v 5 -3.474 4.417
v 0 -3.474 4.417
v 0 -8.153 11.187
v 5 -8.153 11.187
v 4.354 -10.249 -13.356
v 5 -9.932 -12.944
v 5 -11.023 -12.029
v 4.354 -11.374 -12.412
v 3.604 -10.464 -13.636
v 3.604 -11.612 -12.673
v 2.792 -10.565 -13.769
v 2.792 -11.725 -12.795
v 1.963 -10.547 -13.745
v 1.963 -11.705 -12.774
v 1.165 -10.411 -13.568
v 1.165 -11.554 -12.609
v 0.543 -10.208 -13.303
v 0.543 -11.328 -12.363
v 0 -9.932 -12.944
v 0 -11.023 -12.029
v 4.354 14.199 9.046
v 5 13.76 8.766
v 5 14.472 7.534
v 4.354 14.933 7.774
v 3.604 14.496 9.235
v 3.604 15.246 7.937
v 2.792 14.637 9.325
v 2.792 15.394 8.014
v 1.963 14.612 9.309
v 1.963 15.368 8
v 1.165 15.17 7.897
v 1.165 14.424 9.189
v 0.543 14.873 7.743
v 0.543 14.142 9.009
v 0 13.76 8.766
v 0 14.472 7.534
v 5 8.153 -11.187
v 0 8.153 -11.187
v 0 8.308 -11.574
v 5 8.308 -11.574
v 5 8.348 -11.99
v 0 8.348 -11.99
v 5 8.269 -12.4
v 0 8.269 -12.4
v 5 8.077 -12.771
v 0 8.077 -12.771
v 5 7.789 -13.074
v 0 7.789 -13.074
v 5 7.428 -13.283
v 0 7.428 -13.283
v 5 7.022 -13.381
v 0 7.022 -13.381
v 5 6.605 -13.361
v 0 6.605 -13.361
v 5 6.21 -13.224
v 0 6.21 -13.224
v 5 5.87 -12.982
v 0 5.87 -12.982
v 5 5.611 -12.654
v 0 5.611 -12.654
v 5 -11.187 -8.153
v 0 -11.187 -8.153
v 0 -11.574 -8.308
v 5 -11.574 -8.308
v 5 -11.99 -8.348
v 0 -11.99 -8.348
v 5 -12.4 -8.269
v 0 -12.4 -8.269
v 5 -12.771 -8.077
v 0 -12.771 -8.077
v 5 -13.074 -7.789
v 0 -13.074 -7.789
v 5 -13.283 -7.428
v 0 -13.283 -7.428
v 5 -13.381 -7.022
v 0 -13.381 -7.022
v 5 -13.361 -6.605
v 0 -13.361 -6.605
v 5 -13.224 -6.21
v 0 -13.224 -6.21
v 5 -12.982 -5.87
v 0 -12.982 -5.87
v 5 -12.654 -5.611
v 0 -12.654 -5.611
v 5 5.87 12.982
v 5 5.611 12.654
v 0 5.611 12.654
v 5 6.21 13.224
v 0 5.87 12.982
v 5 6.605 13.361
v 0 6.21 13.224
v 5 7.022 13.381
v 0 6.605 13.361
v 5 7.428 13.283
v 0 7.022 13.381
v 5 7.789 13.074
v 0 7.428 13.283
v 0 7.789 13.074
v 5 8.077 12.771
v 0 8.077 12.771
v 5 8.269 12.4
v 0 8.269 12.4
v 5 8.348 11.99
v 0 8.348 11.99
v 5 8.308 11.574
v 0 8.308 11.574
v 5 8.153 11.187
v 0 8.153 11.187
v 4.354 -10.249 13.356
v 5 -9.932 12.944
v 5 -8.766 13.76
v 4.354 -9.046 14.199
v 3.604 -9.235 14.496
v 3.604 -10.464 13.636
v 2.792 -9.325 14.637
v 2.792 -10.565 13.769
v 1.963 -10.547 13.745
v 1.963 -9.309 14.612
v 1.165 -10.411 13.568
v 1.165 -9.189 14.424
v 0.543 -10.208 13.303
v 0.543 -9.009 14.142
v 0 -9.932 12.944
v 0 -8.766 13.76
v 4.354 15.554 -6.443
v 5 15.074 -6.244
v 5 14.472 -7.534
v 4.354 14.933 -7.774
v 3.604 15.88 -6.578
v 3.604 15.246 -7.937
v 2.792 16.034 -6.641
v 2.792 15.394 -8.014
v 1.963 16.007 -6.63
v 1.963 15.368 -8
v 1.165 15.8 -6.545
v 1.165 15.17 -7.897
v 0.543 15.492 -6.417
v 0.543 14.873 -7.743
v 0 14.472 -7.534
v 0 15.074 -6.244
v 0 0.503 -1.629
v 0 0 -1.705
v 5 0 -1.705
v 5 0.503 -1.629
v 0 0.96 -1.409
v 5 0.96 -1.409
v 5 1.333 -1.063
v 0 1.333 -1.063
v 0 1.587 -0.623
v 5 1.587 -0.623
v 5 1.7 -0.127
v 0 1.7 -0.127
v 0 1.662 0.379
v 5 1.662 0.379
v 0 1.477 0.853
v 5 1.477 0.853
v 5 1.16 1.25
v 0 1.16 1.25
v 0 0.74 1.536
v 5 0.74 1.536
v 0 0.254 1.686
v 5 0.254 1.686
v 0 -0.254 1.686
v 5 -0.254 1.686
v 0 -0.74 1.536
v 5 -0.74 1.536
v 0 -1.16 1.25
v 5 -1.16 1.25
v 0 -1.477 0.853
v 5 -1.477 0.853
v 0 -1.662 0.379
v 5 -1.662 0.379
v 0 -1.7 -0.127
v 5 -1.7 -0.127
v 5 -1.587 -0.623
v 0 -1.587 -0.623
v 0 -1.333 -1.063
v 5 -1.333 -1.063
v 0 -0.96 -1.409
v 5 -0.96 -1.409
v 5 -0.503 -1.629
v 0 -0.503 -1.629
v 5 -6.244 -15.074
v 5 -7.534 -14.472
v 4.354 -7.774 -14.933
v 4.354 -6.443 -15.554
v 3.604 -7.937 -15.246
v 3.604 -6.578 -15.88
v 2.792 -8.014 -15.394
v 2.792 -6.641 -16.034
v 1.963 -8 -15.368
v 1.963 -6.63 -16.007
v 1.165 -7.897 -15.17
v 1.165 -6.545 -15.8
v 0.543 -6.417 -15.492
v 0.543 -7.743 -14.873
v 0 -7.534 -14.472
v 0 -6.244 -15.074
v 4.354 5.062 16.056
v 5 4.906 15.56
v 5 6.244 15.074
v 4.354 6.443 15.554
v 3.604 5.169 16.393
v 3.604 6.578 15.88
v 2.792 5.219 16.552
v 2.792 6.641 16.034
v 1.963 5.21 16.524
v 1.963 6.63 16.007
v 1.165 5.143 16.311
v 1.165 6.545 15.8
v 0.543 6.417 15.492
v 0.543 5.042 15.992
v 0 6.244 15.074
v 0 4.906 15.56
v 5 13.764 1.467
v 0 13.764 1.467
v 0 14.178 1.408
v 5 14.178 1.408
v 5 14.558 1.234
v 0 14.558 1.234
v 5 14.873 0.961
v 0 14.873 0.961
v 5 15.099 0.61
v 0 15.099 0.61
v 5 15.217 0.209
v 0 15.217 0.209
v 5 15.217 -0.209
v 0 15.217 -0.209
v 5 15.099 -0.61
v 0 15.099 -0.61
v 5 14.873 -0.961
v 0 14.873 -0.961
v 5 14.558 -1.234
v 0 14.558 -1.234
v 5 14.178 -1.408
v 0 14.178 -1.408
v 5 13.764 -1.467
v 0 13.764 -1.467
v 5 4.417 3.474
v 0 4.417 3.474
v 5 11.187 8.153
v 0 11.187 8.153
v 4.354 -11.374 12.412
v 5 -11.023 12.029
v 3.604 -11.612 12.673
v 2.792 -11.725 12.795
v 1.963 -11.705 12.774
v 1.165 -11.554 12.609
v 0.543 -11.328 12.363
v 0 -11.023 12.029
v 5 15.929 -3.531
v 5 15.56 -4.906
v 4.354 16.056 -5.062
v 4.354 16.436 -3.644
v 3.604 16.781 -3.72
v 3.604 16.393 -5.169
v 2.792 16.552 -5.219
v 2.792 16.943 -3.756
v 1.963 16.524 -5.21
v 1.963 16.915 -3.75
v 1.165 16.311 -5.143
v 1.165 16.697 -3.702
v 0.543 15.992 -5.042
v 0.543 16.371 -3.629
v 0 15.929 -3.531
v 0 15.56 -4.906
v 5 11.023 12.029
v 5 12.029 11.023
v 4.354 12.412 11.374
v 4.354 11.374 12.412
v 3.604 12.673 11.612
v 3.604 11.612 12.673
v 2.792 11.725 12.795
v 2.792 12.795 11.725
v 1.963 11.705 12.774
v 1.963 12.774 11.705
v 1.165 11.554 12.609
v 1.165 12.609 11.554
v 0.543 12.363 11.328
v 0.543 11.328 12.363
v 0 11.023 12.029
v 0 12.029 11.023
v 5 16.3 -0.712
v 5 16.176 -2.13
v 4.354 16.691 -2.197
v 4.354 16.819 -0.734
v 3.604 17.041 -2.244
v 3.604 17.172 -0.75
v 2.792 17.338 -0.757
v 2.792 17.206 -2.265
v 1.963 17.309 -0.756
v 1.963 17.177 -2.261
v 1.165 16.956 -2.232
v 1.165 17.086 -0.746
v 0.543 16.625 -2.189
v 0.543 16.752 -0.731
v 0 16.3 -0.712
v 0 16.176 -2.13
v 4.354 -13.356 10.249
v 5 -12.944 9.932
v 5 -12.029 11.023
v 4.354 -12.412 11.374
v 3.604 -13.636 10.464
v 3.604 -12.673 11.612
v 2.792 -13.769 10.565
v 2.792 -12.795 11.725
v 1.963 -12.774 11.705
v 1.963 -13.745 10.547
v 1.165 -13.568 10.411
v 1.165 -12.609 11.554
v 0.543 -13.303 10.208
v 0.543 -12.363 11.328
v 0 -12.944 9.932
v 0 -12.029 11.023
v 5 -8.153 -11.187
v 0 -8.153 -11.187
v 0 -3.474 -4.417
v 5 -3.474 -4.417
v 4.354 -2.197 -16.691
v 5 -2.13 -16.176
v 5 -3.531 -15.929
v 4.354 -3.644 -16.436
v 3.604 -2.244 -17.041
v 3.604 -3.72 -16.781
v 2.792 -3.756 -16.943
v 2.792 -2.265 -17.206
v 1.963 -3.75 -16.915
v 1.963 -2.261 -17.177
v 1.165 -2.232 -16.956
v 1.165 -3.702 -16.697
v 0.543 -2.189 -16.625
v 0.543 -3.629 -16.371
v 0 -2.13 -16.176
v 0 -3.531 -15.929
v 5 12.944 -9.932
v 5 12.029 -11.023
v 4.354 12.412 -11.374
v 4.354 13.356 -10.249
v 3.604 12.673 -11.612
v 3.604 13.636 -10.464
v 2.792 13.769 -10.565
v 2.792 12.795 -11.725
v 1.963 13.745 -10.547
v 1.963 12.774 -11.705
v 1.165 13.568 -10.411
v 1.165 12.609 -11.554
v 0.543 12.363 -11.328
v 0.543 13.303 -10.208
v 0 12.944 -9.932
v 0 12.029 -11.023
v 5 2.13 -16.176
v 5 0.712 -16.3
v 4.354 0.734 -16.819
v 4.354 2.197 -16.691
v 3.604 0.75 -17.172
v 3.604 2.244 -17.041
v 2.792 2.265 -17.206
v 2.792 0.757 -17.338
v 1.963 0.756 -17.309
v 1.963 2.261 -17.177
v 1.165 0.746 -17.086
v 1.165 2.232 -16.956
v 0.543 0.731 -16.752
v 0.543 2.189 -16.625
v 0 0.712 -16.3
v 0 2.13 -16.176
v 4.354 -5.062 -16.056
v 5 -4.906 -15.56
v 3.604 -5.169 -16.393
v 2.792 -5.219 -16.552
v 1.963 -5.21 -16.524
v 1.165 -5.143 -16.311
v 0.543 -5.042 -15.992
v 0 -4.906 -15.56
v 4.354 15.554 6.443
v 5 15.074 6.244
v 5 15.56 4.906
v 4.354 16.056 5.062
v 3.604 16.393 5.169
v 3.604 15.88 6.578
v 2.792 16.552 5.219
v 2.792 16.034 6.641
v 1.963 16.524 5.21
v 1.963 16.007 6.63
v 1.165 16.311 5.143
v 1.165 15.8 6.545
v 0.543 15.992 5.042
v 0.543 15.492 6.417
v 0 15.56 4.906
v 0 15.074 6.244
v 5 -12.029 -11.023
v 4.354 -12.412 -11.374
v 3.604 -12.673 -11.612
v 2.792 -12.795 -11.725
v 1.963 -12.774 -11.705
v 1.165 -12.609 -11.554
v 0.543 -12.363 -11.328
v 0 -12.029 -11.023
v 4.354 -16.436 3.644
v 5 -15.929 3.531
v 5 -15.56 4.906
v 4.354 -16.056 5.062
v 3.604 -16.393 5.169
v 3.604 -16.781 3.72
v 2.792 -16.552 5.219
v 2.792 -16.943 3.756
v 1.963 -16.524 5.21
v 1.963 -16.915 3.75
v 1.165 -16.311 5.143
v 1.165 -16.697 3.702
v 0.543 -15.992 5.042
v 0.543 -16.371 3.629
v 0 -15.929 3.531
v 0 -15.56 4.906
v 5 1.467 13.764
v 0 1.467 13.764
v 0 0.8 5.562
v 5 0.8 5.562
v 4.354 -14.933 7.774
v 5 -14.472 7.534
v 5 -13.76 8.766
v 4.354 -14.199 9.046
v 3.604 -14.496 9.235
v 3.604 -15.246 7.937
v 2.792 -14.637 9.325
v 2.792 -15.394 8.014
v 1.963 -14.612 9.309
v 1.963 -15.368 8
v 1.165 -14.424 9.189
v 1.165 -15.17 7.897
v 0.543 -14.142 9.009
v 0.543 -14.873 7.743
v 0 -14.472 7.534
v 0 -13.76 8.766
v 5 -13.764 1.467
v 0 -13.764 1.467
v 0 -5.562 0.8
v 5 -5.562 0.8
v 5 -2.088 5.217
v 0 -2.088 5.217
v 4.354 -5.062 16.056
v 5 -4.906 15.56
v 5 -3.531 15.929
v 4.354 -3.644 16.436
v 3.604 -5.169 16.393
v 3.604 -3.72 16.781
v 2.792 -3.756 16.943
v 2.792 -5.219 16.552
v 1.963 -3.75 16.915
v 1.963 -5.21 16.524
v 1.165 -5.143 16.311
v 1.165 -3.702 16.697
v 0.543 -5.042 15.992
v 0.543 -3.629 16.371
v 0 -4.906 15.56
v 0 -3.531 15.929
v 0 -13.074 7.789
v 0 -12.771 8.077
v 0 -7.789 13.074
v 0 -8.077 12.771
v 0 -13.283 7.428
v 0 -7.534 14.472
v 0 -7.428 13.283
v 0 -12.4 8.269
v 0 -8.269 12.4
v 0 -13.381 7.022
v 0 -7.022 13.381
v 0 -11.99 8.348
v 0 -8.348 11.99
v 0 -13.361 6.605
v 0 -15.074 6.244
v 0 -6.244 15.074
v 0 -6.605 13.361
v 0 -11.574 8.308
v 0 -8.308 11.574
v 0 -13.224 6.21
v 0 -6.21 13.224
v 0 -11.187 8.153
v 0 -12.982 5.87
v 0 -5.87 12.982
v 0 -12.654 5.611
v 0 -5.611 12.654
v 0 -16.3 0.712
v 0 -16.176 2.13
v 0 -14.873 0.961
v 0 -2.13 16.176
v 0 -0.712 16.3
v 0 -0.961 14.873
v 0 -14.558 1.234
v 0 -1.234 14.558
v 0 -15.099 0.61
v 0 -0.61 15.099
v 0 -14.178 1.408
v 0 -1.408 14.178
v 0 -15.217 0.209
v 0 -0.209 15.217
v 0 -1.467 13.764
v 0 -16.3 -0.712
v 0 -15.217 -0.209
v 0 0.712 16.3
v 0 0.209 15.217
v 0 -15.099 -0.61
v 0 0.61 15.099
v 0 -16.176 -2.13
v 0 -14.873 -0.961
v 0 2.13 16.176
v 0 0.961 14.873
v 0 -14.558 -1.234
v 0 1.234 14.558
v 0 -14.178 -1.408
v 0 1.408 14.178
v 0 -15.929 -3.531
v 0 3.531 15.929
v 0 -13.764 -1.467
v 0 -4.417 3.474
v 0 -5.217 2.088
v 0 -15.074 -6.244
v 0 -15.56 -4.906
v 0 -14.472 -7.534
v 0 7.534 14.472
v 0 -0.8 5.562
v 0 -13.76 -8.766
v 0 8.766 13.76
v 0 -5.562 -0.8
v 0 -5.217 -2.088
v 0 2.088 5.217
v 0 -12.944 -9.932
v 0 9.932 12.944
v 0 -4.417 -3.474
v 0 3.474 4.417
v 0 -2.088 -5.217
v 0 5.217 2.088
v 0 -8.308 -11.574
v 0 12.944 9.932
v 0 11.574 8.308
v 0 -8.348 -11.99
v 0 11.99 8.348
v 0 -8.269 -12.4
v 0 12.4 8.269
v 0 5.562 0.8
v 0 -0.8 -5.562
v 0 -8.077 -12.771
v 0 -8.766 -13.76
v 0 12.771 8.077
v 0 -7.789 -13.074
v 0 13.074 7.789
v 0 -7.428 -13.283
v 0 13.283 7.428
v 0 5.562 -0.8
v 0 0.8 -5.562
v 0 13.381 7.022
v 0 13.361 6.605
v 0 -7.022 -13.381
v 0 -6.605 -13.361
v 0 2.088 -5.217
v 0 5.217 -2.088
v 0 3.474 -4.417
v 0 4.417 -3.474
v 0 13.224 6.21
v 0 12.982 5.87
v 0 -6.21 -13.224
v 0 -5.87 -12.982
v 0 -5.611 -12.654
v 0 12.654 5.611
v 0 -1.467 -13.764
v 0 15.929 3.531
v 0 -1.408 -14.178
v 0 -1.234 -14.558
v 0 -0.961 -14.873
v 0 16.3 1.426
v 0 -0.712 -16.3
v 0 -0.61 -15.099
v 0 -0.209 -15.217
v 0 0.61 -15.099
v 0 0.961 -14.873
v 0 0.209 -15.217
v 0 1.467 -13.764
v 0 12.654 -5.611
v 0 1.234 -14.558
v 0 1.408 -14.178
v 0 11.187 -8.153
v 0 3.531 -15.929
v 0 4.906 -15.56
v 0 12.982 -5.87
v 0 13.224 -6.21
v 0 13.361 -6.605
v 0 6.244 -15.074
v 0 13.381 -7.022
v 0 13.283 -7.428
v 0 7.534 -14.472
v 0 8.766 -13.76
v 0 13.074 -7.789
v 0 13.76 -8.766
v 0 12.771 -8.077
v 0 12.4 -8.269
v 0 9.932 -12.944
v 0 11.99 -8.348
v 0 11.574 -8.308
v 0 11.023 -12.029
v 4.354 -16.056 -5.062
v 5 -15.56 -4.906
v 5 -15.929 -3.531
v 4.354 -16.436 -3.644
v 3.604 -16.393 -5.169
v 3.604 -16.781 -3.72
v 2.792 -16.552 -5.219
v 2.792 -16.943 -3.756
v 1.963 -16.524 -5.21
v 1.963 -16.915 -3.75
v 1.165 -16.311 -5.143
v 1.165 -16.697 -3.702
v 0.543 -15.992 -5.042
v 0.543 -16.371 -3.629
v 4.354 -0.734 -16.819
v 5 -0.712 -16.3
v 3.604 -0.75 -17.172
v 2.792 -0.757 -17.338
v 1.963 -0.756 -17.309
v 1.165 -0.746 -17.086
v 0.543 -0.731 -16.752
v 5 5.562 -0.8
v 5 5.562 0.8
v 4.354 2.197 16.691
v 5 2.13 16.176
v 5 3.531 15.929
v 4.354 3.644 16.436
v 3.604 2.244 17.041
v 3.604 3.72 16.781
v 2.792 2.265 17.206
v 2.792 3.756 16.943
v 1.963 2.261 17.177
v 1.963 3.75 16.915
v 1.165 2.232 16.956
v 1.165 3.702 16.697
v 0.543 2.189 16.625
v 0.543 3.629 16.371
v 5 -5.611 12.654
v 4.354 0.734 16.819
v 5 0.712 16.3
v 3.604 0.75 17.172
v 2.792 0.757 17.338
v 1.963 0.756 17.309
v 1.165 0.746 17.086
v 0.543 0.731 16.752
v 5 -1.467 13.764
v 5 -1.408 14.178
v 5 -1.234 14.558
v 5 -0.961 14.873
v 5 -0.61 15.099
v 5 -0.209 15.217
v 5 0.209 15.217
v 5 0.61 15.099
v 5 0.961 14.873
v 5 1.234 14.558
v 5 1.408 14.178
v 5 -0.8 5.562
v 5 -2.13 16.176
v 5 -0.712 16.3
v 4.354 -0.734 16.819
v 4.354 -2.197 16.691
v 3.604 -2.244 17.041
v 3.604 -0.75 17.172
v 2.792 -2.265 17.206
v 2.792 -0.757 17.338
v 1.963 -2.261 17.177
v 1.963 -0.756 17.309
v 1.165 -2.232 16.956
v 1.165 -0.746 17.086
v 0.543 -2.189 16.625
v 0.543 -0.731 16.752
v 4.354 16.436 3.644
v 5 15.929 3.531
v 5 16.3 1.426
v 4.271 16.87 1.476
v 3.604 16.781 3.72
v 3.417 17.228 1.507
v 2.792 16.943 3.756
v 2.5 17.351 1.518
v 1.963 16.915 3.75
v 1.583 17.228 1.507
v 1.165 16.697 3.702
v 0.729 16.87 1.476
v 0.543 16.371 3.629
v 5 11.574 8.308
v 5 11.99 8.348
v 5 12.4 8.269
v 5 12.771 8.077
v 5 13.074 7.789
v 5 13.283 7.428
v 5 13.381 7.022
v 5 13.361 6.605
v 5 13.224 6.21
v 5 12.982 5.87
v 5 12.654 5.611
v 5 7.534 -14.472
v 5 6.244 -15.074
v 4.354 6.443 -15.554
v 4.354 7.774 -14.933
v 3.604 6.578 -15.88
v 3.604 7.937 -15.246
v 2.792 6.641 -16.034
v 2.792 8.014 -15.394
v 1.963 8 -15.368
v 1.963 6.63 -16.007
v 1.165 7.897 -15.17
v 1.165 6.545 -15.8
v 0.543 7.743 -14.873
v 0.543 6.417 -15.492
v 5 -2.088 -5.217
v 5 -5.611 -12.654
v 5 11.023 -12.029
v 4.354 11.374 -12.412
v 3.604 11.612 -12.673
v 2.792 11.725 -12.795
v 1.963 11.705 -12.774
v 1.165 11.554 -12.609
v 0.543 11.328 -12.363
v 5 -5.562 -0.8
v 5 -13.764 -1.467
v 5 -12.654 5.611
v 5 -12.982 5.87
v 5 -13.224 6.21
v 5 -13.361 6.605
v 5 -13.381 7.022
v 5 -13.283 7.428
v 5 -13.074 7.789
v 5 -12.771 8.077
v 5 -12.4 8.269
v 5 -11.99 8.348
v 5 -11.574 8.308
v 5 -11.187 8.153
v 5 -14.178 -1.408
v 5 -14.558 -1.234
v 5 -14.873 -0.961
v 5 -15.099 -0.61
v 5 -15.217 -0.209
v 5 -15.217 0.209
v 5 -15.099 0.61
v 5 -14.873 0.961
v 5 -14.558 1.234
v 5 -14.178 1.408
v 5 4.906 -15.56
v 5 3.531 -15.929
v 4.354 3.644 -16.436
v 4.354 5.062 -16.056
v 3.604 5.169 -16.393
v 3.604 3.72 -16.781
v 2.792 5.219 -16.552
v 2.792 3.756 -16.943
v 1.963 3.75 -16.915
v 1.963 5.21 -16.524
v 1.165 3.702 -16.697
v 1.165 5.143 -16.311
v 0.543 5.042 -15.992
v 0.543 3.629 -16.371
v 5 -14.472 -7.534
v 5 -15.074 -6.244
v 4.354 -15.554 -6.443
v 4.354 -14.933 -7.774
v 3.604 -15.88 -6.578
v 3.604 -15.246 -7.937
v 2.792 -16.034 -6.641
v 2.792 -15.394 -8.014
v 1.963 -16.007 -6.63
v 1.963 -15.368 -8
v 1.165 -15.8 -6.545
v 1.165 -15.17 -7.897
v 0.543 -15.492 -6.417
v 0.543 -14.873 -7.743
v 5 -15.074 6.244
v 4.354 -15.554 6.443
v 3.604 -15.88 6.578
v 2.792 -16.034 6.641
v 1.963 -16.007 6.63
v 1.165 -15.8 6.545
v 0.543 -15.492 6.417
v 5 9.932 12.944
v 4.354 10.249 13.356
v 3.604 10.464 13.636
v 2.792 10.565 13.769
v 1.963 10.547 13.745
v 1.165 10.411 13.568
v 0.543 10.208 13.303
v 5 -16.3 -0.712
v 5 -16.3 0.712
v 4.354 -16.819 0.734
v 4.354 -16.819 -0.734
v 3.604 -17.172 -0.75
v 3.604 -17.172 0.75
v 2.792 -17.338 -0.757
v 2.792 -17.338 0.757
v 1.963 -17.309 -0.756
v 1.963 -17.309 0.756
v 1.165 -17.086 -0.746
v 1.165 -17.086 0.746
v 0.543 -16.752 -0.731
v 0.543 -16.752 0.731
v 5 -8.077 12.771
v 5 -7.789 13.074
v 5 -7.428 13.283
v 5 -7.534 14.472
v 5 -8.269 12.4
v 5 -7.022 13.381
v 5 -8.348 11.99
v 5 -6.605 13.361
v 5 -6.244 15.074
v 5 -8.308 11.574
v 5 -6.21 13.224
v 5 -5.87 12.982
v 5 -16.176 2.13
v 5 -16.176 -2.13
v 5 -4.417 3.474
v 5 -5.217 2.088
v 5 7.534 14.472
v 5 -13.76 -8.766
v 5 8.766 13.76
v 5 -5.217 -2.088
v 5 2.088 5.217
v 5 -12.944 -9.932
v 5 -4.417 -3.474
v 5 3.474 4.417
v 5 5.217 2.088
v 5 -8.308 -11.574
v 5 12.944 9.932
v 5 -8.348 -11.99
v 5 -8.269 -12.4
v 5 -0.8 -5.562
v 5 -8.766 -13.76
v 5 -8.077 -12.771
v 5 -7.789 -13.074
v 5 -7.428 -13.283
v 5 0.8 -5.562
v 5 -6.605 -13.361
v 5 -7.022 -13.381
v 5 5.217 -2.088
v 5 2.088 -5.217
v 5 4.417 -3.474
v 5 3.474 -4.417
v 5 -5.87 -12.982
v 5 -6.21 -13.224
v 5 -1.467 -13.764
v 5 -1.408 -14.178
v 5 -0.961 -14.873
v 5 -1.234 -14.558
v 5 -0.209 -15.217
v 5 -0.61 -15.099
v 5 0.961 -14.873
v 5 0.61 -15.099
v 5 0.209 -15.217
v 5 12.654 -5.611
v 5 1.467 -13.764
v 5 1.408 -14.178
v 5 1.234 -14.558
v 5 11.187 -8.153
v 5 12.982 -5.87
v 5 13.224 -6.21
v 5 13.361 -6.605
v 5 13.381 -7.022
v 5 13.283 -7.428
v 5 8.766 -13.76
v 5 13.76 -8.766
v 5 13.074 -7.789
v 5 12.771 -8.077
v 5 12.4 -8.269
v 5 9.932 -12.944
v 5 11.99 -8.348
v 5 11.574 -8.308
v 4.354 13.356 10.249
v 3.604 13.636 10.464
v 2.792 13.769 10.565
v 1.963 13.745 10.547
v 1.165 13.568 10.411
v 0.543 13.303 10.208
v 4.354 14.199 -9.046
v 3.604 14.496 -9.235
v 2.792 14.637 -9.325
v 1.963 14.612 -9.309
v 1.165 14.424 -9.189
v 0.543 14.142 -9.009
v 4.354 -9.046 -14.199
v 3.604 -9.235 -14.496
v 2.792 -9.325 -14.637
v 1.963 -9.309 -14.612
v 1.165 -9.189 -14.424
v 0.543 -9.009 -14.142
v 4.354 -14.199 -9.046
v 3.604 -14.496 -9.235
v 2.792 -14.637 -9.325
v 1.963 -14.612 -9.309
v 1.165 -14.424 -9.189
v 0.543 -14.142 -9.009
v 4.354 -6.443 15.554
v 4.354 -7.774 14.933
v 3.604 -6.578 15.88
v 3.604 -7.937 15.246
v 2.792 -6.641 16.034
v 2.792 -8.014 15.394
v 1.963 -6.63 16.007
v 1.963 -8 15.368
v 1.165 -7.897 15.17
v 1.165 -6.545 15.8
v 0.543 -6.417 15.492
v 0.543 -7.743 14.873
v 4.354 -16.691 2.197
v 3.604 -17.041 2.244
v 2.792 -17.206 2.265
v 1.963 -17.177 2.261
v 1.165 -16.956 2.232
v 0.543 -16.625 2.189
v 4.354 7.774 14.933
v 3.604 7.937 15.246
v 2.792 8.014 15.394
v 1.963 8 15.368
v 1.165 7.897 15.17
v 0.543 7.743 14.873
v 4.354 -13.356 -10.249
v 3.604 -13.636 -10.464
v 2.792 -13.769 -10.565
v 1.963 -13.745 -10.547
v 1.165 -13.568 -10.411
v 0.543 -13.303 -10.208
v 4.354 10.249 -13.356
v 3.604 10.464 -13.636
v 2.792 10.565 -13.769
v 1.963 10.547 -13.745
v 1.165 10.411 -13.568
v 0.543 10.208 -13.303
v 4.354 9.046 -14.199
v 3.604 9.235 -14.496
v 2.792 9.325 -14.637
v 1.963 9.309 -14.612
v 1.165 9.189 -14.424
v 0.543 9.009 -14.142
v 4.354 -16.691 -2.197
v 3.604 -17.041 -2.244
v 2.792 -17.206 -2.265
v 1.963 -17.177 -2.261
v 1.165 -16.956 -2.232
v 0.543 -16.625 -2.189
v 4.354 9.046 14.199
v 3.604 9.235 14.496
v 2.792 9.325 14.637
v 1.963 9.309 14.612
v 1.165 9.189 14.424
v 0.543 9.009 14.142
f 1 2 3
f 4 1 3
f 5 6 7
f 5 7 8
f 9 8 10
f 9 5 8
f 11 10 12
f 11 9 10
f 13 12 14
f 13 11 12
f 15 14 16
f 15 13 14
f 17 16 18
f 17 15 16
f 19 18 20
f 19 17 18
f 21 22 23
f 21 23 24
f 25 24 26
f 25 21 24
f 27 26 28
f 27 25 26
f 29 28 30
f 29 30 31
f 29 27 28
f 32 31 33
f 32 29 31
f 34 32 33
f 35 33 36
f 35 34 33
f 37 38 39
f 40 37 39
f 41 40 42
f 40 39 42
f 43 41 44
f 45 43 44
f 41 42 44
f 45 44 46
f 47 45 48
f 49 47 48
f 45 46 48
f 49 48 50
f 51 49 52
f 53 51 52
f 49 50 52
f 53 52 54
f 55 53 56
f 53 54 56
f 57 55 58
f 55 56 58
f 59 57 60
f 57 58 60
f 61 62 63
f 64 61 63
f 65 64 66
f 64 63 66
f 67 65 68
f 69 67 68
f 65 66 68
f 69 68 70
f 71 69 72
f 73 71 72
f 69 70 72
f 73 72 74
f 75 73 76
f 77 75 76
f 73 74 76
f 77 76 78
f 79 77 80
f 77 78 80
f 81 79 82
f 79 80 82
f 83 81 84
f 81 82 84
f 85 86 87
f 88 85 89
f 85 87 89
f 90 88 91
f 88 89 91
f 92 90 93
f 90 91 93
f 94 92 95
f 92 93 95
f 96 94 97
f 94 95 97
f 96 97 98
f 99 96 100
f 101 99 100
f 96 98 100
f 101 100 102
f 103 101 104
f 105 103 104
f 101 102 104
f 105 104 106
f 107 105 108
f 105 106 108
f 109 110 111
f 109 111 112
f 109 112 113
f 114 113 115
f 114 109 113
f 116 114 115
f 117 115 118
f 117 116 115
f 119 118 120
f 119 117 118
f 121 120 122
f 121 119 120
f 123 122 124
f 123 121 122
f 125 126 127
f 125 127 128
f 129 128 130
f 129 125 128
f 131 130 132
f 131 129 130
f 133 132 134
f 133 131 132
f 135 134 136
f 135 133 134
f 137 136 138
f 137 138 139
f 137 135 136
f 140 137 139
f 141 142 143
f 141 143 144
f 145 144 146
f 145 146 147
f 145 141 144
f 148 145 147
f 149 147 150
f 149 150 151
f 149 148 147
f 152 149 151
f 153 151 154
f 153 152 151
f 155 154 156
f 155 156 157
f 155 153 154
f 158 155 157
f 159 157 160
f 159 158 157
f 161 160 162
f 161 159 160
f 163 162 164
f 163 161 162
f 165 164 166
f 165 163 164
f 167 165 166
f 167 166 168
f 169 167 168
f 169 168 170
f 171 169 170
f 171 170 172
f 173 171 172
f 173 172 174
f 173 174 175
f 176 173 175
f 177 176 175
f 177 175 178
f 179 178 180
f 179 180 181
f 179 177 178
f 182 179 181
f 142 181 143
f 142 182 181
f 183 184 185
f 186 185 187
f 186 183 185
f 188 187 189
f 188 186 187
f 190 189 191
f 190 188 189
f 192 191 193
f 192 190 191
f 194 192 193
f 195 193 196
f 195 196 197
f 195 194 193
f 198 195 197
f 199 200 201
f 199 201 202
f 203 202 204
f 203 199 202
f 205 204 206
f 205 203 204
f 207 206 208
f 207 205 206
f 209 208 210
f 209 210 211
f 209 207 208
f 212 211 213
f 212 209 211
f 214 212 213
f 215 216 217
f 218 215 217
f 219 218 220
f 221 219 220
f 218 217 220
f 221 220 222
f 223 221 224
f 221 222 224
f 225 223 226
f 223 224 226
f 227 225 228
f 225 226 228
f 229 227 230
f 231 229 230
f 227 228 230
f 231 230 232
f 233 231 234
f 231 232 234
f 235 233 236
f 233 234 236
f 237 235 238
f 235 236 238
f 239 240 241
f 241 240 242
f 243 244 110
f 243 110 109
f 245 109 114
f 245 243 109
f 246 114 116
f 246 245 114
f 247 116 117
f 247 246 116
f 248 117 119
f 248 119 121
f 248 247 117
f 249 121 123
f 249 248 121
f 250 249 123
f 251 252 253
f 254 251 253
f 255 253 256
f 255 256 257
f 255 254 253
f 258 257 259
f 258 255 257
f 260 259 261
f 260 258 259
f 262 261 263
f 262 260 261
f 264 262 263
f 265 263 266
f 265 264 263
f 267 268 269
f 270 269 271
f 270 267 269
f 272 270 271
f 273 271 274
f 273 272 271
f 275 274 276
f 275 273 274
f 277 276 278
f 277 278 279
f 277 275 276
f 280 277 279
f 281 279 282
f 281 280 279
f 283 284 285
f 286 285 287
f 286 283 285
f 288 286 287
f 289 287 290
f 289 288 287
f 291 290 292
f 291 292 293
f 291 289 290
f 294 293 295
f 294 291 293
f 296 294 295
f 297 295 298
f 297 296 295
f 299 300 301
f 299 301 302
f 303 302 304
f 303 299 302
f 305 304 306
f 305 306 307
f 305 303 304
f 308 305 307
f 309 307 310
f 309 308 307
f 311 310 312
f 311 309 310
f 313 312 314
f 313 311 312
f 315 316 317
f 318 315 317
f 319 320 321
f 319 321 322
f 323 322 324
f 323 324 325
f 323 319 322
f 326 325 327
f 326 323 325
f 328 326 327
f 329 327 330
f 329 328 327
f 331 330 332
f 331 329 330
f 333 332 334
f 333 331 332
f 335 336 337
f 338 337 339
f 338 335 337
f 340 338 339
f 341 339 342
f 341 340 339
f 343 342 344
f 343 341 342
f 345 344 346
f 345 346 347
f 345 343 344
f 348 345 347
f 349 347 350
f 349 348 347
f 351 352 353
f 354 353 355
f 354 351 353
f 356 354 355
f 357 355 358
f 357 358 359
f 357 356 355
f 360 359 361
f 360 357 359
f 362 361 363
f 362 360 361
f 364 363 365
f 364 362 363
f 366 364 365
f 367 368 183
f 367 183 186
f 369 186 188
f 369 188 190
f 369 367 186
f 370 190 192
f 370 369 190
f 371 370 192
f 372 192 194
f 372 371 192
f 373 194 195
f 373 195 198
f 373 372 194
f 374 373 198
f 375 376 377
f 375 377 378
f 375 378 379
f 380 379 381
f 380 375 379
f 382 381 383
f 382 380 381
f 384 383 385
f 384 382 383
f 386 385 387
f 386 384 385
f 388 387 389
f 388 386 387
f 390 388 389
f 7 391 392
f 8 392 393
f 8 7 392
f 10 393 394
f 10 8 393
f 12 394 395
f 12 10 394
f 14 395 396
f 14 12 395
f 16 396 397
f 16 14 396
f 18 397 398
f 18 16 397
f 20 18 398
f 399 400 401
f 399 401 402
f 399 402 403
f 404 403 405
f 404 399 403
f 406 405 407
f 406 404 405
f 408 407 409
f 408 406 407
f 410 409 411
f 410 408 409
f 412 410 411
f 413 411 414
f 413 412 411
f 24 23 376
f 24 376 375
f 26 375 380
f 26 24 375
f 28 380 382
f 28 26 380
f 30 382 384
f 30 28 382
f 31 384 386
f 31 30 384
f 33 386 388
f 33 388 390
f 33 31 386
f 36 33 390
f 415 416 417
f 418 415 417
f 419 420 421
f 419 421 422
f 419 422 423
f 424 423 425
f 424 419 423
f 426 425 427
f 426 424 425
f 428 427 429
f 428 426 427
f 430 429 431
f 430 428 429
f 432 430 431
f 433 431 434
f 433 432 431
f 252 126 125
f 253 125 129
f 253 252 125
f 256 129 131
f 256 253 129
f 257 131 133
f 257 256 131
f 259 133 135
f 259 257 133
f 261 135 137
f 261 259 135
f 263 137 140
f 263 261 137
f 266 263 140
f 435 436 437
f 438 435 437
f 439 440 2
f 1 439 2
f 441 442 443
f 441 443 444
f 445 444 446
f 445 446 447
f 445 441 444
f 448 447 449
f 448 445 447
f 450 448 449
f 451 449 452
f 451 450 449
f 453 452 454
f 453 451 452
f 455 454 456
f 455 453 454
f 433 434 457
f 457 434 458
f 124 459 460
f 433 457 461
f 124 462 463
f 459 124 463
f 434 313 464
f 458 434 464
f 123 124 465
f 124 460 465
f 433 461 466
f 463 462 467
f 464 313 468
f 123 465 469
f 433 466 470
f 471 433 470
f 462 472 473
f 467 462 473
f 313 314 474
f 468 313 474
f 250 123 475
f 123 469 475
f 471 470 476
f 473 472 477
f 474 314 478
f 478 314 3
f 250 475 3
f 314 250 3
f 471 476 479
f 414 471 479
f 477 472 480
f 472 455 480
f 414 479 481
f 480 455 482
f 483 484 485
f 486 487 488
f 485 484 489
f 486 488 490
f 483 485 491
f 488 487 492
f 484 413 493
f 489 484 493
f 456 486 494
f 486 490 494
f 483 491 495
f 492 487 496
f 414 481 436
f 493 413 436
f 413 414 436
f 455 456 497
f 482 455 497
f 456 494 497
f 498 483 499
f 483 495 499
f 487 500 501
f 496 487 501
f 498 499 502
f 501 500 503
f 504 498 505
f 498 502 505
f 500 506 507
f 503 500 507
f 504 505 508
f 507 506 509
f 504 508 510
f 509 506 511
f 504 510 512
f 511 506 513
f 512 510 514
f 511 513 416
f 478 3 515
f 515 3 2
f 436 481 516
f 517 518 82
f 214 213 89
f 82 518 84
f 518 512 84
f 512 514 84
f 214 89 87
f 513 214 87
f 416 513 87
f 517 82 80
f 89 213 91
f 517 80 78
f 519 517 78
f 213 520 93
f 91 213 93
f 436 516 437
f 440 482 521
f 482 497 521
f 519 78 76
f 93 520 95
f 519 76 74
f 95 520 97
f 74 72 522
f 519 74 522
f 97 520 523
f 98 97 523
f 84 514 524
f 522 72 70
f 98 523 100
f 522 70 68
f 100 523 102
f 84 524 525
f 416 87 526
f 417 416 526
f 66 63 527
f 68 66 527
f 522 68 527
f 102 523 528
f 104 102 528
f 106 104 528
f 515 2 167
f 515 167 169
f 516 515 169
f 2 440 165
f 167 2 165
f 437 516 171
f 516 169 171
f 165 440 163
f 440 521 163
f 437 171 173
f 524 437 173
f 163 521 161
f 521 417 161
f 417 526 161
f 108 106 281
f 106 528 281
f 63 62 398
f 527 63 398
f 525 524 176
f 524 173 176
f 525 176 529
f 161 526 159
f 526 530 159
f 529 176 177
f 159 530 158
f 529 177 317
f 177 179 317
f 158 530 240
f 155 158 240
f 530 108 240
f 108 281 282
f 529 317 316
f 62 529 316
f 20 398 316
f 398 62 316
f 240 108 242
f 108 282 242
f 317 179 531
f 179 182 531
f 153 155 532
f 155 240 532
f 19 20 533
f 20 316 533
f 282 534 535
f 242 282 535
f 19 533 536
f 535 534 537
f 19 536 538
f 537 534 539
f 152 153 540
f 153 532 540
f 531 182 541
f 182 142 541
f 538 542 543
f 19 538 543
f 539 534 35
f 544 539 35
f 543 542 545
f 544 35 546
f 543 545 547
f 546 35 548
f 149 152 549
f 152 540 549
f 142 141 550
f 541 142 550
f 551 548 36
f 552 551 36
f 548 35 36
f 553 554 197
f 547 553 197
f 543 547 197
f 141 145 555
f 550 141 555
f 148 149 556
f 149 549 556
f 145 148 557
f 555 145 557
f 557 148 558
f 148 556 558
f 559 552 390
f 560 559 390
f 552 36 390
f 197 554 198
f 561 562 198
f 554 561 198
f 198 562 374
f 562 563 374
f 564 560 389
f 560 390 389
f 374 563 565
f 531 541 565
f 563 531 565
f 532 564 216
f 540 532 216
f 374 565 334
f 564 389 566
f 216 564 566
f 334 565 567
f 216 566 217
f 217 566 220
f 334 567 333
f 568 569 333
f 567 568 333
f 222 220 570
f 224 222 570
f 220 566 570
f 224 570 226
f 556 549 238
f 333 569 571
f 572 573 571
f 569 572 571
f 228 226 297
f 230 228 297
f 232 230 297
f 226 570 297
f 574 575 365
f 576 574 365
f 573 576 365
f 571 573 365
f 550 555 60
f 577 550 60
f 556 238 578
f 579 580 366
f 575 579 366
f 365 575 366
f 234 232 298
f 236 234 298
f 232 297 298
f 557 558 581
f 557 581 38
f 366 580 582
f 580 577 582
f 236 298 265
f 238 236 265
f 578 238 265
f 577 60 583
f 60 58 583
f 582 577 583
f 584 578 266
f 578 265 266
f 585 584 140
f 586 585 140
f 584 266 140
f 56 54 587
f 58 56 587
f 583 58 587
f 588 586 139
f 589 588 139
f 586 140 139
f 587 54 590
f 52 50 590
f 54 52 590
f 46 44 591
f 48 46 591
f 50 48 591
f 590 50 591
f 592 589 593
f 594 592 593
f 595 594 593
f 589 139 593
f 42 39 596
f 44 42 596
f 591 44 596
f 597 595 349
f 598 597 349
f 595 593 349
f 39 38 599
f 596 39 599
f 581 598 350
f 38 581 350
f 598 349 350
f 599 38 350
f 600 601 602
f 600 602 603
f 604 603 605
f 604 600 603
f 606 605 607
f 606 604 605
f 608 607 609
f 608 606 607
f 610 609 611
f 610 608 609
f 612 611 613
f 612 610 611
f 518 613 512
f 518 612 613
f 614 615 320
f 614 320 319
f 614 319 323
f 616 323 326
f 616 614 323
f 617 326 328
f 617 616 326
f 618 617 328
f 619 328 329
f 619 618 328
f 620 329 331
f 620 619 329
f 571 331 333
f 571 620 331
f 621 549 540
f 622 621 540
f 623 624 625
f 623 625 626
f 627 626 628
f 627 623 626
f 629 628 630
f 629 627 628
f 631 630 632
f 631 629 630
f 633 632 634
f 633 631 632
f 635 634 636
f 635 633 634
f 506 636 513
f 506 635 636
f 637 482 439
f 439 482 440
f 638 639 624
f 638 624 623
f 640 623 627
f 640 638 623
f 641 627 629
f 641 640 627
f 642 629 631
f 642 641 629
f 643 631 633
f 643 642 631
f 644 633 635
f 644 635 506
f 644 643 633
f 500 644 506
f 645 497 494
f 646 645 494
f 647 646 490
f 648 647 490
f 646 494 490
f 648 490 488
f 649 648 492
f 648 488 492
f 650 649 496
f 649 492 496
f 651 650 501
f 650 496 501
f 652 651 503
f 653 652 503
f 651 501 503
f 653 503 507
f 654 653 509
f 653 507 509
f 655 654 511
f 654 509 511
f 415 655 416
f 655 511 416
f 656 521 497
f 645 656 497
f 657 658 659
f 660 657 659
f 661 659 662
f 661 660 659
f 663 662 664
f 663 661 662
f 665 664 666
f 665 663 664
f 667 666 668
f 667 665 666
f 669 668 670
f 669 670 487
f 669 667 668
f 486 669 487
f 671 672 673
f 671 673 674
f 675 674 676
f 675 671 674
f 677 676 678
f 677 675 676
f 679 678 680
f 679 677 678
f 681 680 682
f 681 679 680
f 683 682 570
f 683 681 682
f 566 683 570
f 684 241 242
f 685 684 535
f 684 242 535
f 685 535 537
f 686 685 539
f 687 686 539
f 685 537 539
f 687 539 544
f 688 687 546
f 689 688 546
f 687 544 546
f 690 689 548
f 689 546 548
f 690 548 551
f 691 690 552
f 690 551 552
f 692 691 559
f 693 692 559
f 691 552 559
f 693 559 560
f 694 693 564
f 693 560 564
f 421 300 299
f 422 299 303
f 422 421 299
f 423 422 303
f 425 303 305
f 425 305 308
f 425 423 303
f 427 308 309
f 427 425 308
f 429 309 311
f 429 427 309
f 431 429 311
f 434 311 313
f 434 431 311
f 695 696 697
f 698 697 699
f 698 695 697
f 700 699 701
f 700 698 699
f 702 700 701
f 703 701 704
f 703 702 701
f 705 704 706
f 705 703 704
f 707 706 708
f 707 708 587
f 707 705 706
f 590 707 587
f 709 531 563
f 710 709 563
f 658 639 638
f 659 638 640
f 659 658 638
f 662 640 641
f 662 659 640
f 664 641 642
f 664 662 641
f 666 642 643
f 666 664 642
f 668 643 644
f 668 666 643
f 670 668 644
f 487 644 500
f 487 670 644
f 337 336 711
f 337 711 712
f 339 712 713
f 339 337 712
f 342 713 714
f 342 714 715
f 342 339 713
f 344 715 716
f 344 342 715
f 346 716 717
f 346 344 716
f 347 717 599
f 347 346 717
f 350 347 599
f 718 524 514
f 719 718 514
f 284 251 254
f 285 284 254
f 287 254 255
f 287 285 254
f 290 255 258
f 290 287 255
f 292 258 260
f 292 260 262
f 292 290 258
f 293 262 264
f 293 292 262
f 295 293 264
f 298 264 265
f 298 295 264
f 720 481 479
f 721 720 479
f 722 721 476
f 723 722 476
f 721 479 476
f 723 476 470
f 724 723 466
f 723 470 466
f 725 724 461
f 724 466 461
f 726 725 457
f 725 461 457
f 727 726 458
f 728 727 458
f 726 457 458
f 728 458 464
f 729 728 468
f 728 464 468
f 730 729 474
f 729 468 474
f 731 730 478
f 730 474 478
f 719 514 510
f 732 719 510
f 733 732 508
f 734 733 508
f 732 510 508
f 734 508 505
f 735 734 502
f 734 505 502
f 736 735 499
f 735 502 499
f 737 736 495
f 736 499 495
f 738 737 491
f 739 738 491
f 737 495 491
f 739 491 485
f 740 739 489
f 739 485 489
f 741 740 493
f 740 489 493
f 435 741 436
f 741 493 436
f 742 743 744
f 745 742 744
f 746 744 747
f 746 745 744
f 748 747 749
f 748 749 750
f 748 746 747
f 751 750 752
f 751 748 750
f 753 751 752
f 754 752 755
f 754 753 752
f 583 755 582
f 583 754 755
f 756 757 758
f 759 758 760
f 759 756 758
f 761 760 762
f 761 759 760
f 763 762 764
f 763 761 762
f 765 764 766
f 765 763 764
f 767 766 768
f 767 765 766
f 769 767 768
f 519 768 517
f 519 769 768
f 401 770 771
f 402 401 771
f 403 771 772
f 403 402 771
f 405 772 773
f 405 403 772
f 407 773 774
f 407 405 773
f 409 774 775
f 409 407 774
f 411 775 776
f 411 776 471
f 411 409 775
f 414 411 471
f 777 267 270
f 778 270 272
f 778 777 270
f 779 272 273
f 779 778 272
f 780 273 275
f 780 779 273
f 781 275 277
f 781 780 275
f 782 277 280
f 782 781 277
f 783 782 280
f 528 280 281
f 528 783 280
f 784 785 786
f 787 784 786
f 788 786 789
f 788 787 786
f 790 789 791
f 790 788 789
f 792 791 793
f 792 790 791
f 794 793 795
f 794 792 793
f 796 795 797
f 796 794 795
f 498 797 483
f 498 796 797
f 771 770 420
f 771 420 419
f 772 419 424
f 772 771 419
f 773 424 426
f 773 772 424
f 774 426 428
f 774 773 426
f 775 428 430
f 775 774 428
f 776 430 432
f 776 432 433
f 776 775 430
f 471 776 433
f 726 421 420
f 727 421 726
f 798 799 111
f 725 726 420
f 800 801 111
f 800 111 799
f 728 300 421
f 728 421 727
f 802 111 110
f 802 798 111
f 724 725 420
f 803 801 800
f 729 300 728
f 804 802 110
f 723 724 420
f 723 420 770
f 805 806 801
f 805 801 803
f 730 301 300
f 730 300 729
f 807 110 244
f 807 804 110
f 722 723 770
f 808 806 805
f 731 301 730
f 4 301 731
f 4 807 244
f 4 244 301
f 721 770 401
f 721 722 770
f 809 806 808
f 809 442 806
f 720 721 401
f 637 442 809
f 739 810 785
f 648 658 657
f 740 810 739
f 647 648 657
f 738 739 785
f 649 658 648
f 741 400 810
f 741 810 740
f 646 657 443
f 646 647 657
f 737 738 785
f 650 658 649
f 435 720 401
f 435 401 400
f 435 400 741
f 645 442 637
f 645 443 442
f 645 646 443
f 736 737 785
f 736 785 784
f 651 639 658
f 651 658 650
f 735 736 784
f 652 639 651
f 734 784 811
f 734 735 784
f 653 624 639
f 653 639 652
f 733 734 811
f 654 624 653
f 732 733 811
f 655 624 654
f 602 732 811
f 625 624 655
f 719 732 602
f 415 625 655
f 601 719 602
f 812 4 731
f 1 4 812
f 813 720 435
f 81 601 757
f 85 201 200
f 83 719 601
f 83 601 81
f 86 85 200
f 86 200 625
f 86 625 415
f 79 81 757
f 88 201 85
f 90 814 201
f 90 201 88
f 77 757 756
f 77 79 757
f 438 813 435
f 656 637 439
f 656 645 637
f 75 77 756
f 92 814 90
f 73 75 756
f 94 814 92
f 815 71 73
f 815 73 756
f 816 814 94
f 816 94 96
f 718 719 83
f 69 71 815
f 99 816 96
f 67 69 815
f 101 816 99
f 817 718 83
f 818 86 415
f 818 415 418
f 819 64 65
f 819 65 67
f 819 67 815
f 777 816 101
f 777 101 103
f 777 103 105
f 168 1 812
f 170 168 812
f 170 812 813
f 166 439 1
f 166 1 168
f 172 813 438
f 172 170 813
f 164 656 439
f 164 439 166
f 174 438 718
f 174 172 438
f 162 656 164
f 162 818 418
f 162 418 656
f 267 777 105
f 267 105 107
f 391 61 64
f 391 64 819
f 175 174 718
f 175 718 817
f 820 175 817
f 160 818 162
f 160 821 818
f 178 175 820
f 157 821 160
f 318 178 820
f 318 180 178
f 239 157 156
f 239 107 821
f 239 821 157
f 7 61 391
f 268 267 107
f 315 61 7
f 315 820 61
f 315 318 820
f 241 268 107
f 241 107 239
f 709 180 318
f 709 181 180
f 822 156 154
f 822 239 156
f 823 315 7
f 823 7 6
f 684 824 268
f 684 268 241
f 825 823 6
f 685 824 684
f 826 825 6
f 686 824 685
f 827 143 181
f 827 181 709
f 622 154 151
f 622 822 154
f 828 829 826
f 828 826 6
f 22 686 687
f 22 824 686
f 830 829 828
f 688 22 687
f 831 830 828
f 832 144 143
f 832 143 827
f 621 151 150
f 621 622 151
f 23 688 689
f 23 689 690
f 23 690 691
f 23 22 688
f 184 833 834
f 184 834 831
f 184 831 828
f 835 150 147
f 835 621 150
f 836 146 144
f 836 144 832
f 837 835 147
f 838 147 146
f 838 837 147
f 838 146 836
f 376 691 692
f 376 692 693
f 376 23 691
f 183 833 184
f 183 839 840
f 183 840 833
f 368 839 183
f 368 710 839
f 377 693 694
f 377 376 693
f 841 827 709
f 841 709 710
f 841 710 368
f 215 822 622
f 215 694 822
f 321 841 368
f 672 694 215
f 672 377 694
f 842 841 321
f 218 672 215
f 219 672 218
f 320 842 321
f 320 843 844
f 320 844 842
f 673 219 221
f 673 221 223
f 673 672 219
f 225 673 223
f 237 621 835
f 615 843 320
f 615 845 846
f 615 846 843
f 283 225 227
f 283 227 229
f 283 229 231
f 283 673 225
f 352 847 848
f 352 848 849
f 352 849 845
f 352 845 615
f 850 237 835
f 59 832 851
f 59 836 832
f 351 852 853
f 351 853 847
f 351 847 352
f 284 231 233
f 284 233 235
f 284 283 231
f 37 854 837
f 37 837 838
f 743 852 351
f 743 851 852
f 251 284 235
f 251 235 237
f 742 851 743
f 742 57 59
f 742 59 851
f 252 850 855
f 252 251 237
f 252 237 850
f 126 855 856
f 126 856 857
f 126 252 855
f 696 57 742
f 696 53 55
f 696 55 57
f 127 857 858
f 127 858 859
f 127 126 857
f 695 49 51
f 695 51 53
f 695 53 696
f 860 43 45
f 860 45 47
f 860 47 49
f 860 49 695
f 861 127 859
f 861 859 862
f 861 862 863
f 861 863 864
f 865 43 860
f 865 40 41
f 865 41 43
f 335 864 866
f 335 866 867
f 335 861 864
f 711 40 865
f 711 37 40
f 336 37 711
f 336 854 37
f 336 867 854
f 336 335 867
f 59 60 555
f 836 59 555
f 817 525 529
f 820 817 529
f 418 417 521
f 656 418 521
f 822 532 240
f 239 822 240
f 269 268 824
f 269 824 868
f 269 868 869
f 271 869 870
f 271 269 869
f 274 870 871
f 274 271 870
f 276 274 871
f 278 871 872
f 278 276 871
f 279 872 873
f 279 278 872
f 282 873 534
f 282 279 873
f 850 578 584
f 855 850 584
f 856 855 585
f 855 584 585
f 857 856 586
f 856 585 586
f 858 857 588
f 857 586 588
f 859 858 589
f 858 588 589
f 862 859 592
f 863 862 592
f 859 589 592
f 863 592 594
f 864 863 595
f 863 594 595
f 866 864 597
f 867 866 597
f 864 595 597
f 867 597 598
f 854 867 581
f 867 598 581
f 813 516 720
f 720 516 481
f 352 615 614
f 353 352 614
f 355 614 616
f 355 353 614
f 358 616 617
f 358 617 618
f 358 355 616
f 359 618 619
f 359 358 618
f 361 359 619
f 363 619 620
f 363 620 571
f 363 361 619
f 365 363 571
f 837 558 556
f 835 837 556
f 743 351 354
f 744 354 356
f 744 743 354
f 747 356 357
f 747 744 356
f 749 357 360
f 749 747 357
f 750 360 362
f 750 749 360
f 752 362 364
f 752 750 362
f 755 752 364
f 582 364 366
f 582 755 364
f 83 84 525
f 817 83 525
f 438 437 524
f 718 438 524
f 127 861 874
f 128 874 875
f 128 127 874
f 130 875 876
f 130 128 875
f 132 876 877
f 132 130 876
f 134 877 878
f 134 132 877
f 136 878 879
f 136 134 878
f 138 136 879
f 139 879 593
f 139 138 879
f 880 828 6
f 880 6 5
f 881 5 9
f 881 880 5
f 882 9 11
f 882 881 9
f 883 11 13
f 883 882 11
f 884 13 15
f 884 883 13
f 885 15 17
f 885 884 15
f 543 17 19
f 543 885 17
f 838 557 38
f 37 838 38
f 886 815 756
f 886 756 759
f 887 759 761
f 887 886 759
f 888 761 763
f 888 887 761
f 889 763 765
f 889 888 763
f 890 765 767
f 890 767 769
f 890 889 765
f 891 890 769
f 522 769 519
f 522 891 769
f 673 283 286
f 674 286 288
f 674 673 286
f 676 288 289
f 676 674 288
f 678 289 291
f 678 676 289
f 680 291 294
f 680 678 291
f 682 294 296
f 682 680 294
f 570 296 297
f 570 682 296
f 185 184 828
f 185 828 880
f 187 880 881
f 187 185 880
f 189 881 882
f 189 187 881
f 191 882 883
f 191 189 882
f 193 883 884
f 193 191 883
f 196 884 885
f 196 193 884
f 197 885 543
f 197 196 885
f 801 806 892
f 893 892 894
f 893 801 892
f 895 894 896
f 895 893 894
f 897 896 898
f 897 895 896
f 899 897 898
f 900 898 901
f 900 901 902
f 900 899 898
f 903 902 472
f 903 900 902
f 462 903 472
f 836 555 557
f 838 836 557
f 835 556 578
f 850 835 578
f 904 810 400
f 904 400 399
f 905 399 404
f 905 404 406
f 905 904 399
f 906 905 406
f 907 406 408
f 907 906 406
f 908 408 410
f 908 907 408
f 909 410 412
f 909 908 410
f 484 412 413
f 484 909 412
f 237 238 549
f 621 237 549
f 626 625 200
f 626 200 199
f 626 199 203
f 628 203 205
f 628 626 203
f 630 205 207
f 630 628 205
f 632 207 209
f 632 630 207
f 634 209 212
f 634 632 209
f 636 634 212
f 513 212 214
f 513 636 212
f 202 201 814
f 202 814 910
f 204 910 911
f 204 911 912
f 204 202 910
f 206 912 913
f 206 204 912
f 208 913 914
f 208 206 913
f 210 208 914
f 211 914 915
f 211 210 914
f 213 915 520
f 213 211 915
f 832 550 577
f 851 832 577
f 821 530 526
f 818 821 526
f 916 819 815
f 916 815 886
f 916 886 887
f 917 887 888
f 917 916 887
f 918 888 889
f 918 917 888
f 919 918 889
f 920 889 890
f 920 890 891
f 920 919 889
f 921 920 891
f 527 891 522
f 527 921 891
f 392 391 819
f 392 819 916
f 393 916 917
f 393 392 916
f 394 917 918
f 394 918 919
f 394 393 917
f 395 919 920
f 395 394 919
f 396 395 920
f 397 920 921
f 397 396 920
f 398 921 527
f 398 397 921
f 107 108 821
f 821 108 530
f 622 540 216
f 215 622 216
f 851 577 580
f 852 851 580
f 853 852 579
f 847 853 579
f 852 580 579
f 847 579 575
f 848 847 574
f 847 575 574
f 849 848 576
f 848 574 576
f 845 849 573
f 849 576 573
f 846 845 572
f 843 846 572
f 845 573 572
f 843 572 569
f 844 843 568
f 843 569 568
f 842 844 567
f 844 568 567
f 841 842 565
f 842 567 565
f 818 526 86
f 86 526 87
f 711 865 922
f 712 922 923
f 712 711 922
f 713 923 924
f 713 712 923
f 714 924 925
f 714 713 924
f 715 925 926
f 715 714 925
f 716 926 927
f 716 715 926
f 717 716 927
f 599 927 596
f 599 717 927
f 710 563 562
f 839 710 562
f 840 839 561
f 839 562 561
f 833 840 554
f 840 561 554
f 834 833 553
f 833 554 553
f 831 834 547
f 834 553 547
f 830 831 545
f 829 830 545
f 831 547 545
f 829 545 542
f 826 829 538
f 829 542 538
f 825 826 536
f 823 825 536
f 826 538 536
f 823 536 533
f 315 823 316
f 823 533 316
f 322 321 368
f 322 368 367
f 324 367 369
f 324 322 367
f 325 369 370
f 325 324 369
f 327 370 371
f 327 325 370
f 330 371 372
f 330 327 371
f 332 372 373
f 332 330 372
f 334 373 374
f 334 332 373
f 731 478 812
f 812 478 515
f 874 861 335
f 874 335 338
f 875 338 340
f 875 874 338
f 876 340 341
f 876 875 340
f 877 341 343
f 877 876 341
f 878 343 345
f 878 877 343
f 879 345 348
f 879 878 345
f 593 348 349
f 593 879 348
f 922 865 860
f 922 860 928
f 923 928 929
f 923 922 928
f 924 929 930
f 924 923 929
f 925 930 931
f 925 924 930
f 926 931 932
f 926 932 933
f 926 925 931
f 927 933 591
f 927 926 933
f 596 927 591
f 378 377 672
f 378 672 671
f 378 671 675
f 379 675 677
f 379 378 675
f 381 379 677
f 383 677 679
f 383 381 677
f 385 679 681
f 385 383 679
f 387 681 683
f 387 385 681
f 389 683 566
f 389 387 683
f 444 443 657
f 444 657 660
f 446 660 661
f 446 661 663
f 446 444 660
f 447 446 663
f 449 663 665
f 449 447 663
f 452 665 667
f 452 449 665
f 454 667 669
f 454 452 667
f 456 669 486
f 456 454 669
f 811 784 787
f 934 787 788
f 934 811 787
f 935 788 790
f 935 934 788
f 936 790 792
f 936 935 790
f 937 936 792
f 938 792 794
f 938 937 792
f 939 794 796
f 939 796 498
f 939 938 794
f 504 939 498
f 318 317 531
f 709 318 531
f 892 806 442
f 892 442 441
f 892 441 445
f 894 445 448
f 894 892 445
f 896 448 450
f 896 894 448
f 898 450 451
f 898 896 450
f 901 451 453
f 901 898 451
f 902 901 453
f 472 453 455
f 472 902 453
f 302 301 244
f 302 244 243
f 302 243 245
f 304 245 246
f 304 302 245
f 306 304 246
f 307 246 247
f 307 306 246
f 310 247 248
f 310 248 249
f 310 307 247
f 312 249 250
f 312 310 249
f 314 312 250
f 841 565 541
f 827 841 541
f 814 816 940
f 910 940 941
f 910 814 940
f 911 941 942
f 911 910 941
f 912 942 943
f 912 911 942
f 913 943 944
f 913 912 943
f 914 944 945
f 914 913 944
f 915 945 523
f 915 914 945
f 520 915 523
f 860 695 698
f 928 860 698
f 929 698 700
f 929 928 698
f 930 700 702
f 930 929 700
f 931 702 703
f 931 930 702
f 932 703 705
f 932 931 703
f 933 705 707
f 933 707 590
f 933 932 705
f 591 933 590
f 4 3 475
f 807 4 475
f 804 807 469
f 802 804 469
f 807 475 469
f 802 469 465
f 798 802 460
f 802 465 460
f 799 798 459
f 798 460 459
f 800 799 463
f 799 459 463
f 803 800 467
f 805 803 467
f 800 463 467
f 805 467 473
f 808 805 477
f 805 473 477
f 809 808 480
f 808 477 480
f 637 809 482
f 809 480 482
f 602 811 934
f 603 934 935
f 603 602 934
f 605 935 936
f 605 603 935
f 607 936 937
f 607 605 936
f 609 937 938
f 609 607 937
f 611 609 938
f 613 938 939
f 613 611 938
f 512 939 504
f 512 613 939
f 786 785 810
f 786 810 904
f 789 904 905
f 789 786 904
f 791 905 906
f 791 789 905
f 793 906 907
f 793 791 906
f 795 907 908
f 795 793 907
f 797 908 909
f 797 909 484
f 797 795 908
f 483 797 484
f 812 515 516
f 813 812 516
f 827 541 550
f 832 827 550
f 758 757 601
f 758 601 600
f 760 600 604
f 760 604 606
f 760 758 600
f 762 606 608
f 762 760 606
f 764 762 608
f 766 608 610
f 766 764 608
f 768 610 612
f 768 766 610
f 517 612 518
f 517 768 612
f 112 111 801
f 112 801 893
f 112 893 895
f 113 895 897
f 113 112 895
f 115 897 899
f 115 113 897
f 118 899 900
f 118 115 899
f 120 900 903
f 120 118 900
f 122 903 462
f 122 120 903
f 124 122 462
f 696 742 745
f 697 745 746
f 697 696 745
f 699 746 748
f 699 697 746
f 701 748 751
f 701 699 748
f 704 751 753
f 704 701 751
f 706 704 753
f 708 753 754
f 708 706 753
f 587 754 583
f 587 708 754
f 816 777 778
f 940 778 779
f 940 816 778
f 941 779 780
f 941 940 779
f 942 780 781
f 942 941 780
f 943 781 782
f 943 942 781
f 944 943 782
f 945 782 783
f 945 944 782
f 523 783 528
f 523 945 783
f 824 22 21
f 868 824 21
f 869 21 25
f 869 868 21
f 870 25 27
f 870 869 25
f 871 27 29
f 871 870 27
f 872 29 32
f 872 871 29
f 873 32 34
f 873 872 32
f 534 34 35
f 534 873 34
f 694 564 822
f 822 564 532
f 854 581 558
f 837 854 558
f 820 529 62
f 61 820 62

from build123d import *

# Parameters (mm, degrees)
SKETCH1_R           = 20
SKETCH1_R_2         = 1.705
BOSS_EXTRUDE1_DEPTH = 5
CUT_EXTRUDE1_DEPTH  = 8
CIRPATTERN1_COUNT   = 12
CUT_EXTRUDE2_DEPTH  = 2.5
CIRPATTERN2_COUNT   = 71
CIRPATTERN2_ANGLE   = 350


with BuildPart() as part:
    # Sketch1 → Boss-Extrude1 (new body)
    with BuildSketch(Plane(origin=(0, 0, 0), x_dir=(0, 0, -1), z_dir=(1, 0, 0))):
        Circle(SKETCH1_R)
        Circle(SKETCH1_R_2, mode=Mode.SUBTRACT)
    extrude(amount=BOSS_EXTRUDE1_DEPTH)

    # Sketch2 → Cut-Extrude1 (cut)
    with BuildSketch(Plane(origin=(0, 0, 0), x_dir=(0, 0, -1), z_dir=(1, 0, 0))):
        with BuildLine():
            Line((1.467292325, 13.76439168), (0.800439906, 5.562312437))
            Line((0.800439906, 5.562312437), (-0.800439906, 5.562312437))
            Line((-0.800439906, 5.562312437), (-1.467292325, 13.76439168))
            ThreePointArc((-1.467292325, 13.76439168), (0, 15.231684005), (1.467292325, 13.76439168))
        make_face()
    cut_extrude1 = extrude(amount=CUT_EXTRUDE1_DEPTH, mode=Mode.SUBTRACT)

    # CirPattern1: Cut-Extrude1 ×12 about axis
    cirpattern1_axis = Axis((0, 0, 0), (1, 0, 0))
    for i in range(1, CIRPATTERN1_COUNT):
        add(cut_extrude1.rotate(cirpattern1_axis, i * 360 / CIRPATTERN1_COUNT), mode=Mode.SUBTRACT)

    # Sketch6 → Cut-Extrude2 (cut, symmetric)
    with BuildSketch(Plane.XY):
        with BuildLine():
            Line((0, 16.3), (0, 20))
            Line((0, 20), (5, 20))
            Line((5, 20), (5, 16.3))
            ThreePointArc((5, 16.3), (2.5, 17.350510257), (0, 16.3))
        make_face()
    cut_extrude2 = extrude(amount=CUT_EXTRUDE2_DEPTH, both=True, mode=Mode.SUBTRACT)

    # CirPattern2: Cut-Extrude2 ×71 about axis
    cirpattern2_axis = Axis((5, 0, 0), (-1, 0, 0))
    for i in range(1, CIRPATTERN2_COUNT):
        add(cut_extrude2.rotate(cirpattern2_axis, i * CIRPATTERN2_ANGLE / (CIRPATTERN2_COUNT - 1)), mode=Mode.SUBTRACT)


solid = part.part
